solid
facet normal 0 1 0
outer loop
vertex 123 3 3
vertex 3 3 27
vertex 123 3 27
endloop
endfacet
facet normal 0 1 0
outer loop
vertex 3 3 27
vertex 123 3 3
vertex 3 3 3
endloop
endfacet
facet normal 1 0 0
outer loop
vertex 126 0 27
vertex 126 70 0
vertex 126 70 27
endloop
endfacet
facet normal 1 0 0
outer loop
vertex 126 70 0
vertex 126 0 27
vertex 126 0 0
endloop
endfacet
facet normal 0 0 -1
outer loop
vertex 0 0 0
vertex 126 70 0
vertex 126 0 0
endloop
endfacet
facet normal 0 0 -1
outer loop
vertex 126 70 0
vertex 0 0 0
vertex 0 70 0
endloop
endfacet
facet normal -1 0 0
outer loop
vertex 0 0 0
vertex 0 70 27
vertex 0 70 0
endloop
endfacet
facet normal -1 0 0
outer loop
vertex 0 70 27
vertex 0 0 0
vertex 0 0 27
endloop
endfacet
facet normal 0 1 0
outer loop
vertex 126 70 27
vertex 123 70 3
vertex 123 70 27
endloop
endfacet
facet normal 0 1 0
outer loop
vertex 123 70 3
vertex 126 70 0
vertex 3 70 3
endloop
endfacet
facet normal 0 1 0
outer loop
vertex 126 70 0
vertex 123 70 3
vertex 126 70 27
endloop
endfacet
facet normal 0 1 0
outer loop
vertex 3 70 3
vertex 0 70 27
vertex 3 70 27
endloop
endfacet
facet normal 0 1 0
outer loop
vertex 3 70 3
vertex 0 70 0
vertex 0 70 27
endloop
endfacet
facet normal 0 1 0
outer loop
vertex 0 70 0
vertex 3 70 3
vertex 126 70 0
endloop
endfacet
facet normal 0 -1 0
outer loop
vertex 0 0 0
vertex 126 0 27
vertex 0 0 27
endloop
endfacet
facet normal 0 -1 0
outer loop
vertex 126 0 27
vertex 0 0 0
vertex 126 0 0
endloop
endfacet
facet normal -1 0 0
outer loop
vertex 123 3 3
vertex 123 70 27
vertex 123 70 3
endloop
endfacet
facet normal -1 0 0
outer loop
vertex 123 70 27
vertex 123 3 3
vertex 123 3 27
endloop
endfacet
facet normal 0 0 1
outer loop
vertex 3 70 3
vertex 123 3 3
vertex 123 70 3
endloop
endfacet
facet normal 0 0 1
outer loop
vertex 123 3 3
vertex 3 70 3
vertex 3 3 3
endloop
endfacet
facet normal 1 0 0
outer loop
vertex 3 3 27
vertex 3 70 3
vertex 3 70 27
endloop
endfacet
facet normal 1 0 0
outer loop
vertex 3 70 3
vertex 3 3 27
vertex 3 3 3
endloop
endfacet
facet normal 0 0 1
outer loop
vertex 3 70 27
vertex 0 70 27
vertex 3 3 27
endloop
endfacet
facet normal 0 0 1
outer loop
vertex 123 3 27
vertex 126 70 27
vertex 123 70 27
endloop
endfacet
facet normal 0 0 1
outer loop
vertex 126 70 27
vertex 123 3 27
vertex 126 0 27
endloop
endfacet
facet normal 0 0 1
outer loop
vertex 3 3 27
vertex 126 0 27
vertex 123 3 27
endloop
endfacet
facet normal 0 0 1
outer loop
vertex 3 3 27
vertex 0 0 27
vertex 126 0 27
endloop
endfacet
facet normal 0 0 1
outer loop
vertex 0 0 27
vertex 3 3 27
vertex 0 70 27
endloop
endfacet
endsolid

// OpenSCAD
// Open-top rectangular buffer tank for a mini horizontal gel-electrophoresis box. NOVEL general part.
//

inner_l = 120;
inner_w = 70;
height  = 40;
wall    = 3;
platform_clearance = 3;
platform_top_clearance = 10;

$fn = 48;

inner_h = height - wall;
p_above = platform_top_clearance + platform_clearance;

difference() {
    cube([inner_l + 2 * wall, inner_w, height]);
    translate([wall, wall, wall]) cube([inner_l, inner_w, height - wall]);                 // floor
    translate([0, 0, height - p_above]) cube([inner_l + 2 * wall, inner_w, p_above]);       // upper empty space
    // Raised platform spanning the full width, centred in X:
    translate([wall, wall, wall + platform_clearance])
        cube([inner_l - 2 * platform_clearance, inner_w, platform_top_clearance]);
    // Electrode holes: a 2 mm horizontal hole along X near the top, through each end wall, at y = 0
    for (x = [-inner_l / 2 - 1, inner_l / 2 + 1]) {
        translate([x, wall, height - p_above - 1]) rotate([-90, 0, 0]) cylinder(h = inner_w + 2, d = 2);
    }
}
